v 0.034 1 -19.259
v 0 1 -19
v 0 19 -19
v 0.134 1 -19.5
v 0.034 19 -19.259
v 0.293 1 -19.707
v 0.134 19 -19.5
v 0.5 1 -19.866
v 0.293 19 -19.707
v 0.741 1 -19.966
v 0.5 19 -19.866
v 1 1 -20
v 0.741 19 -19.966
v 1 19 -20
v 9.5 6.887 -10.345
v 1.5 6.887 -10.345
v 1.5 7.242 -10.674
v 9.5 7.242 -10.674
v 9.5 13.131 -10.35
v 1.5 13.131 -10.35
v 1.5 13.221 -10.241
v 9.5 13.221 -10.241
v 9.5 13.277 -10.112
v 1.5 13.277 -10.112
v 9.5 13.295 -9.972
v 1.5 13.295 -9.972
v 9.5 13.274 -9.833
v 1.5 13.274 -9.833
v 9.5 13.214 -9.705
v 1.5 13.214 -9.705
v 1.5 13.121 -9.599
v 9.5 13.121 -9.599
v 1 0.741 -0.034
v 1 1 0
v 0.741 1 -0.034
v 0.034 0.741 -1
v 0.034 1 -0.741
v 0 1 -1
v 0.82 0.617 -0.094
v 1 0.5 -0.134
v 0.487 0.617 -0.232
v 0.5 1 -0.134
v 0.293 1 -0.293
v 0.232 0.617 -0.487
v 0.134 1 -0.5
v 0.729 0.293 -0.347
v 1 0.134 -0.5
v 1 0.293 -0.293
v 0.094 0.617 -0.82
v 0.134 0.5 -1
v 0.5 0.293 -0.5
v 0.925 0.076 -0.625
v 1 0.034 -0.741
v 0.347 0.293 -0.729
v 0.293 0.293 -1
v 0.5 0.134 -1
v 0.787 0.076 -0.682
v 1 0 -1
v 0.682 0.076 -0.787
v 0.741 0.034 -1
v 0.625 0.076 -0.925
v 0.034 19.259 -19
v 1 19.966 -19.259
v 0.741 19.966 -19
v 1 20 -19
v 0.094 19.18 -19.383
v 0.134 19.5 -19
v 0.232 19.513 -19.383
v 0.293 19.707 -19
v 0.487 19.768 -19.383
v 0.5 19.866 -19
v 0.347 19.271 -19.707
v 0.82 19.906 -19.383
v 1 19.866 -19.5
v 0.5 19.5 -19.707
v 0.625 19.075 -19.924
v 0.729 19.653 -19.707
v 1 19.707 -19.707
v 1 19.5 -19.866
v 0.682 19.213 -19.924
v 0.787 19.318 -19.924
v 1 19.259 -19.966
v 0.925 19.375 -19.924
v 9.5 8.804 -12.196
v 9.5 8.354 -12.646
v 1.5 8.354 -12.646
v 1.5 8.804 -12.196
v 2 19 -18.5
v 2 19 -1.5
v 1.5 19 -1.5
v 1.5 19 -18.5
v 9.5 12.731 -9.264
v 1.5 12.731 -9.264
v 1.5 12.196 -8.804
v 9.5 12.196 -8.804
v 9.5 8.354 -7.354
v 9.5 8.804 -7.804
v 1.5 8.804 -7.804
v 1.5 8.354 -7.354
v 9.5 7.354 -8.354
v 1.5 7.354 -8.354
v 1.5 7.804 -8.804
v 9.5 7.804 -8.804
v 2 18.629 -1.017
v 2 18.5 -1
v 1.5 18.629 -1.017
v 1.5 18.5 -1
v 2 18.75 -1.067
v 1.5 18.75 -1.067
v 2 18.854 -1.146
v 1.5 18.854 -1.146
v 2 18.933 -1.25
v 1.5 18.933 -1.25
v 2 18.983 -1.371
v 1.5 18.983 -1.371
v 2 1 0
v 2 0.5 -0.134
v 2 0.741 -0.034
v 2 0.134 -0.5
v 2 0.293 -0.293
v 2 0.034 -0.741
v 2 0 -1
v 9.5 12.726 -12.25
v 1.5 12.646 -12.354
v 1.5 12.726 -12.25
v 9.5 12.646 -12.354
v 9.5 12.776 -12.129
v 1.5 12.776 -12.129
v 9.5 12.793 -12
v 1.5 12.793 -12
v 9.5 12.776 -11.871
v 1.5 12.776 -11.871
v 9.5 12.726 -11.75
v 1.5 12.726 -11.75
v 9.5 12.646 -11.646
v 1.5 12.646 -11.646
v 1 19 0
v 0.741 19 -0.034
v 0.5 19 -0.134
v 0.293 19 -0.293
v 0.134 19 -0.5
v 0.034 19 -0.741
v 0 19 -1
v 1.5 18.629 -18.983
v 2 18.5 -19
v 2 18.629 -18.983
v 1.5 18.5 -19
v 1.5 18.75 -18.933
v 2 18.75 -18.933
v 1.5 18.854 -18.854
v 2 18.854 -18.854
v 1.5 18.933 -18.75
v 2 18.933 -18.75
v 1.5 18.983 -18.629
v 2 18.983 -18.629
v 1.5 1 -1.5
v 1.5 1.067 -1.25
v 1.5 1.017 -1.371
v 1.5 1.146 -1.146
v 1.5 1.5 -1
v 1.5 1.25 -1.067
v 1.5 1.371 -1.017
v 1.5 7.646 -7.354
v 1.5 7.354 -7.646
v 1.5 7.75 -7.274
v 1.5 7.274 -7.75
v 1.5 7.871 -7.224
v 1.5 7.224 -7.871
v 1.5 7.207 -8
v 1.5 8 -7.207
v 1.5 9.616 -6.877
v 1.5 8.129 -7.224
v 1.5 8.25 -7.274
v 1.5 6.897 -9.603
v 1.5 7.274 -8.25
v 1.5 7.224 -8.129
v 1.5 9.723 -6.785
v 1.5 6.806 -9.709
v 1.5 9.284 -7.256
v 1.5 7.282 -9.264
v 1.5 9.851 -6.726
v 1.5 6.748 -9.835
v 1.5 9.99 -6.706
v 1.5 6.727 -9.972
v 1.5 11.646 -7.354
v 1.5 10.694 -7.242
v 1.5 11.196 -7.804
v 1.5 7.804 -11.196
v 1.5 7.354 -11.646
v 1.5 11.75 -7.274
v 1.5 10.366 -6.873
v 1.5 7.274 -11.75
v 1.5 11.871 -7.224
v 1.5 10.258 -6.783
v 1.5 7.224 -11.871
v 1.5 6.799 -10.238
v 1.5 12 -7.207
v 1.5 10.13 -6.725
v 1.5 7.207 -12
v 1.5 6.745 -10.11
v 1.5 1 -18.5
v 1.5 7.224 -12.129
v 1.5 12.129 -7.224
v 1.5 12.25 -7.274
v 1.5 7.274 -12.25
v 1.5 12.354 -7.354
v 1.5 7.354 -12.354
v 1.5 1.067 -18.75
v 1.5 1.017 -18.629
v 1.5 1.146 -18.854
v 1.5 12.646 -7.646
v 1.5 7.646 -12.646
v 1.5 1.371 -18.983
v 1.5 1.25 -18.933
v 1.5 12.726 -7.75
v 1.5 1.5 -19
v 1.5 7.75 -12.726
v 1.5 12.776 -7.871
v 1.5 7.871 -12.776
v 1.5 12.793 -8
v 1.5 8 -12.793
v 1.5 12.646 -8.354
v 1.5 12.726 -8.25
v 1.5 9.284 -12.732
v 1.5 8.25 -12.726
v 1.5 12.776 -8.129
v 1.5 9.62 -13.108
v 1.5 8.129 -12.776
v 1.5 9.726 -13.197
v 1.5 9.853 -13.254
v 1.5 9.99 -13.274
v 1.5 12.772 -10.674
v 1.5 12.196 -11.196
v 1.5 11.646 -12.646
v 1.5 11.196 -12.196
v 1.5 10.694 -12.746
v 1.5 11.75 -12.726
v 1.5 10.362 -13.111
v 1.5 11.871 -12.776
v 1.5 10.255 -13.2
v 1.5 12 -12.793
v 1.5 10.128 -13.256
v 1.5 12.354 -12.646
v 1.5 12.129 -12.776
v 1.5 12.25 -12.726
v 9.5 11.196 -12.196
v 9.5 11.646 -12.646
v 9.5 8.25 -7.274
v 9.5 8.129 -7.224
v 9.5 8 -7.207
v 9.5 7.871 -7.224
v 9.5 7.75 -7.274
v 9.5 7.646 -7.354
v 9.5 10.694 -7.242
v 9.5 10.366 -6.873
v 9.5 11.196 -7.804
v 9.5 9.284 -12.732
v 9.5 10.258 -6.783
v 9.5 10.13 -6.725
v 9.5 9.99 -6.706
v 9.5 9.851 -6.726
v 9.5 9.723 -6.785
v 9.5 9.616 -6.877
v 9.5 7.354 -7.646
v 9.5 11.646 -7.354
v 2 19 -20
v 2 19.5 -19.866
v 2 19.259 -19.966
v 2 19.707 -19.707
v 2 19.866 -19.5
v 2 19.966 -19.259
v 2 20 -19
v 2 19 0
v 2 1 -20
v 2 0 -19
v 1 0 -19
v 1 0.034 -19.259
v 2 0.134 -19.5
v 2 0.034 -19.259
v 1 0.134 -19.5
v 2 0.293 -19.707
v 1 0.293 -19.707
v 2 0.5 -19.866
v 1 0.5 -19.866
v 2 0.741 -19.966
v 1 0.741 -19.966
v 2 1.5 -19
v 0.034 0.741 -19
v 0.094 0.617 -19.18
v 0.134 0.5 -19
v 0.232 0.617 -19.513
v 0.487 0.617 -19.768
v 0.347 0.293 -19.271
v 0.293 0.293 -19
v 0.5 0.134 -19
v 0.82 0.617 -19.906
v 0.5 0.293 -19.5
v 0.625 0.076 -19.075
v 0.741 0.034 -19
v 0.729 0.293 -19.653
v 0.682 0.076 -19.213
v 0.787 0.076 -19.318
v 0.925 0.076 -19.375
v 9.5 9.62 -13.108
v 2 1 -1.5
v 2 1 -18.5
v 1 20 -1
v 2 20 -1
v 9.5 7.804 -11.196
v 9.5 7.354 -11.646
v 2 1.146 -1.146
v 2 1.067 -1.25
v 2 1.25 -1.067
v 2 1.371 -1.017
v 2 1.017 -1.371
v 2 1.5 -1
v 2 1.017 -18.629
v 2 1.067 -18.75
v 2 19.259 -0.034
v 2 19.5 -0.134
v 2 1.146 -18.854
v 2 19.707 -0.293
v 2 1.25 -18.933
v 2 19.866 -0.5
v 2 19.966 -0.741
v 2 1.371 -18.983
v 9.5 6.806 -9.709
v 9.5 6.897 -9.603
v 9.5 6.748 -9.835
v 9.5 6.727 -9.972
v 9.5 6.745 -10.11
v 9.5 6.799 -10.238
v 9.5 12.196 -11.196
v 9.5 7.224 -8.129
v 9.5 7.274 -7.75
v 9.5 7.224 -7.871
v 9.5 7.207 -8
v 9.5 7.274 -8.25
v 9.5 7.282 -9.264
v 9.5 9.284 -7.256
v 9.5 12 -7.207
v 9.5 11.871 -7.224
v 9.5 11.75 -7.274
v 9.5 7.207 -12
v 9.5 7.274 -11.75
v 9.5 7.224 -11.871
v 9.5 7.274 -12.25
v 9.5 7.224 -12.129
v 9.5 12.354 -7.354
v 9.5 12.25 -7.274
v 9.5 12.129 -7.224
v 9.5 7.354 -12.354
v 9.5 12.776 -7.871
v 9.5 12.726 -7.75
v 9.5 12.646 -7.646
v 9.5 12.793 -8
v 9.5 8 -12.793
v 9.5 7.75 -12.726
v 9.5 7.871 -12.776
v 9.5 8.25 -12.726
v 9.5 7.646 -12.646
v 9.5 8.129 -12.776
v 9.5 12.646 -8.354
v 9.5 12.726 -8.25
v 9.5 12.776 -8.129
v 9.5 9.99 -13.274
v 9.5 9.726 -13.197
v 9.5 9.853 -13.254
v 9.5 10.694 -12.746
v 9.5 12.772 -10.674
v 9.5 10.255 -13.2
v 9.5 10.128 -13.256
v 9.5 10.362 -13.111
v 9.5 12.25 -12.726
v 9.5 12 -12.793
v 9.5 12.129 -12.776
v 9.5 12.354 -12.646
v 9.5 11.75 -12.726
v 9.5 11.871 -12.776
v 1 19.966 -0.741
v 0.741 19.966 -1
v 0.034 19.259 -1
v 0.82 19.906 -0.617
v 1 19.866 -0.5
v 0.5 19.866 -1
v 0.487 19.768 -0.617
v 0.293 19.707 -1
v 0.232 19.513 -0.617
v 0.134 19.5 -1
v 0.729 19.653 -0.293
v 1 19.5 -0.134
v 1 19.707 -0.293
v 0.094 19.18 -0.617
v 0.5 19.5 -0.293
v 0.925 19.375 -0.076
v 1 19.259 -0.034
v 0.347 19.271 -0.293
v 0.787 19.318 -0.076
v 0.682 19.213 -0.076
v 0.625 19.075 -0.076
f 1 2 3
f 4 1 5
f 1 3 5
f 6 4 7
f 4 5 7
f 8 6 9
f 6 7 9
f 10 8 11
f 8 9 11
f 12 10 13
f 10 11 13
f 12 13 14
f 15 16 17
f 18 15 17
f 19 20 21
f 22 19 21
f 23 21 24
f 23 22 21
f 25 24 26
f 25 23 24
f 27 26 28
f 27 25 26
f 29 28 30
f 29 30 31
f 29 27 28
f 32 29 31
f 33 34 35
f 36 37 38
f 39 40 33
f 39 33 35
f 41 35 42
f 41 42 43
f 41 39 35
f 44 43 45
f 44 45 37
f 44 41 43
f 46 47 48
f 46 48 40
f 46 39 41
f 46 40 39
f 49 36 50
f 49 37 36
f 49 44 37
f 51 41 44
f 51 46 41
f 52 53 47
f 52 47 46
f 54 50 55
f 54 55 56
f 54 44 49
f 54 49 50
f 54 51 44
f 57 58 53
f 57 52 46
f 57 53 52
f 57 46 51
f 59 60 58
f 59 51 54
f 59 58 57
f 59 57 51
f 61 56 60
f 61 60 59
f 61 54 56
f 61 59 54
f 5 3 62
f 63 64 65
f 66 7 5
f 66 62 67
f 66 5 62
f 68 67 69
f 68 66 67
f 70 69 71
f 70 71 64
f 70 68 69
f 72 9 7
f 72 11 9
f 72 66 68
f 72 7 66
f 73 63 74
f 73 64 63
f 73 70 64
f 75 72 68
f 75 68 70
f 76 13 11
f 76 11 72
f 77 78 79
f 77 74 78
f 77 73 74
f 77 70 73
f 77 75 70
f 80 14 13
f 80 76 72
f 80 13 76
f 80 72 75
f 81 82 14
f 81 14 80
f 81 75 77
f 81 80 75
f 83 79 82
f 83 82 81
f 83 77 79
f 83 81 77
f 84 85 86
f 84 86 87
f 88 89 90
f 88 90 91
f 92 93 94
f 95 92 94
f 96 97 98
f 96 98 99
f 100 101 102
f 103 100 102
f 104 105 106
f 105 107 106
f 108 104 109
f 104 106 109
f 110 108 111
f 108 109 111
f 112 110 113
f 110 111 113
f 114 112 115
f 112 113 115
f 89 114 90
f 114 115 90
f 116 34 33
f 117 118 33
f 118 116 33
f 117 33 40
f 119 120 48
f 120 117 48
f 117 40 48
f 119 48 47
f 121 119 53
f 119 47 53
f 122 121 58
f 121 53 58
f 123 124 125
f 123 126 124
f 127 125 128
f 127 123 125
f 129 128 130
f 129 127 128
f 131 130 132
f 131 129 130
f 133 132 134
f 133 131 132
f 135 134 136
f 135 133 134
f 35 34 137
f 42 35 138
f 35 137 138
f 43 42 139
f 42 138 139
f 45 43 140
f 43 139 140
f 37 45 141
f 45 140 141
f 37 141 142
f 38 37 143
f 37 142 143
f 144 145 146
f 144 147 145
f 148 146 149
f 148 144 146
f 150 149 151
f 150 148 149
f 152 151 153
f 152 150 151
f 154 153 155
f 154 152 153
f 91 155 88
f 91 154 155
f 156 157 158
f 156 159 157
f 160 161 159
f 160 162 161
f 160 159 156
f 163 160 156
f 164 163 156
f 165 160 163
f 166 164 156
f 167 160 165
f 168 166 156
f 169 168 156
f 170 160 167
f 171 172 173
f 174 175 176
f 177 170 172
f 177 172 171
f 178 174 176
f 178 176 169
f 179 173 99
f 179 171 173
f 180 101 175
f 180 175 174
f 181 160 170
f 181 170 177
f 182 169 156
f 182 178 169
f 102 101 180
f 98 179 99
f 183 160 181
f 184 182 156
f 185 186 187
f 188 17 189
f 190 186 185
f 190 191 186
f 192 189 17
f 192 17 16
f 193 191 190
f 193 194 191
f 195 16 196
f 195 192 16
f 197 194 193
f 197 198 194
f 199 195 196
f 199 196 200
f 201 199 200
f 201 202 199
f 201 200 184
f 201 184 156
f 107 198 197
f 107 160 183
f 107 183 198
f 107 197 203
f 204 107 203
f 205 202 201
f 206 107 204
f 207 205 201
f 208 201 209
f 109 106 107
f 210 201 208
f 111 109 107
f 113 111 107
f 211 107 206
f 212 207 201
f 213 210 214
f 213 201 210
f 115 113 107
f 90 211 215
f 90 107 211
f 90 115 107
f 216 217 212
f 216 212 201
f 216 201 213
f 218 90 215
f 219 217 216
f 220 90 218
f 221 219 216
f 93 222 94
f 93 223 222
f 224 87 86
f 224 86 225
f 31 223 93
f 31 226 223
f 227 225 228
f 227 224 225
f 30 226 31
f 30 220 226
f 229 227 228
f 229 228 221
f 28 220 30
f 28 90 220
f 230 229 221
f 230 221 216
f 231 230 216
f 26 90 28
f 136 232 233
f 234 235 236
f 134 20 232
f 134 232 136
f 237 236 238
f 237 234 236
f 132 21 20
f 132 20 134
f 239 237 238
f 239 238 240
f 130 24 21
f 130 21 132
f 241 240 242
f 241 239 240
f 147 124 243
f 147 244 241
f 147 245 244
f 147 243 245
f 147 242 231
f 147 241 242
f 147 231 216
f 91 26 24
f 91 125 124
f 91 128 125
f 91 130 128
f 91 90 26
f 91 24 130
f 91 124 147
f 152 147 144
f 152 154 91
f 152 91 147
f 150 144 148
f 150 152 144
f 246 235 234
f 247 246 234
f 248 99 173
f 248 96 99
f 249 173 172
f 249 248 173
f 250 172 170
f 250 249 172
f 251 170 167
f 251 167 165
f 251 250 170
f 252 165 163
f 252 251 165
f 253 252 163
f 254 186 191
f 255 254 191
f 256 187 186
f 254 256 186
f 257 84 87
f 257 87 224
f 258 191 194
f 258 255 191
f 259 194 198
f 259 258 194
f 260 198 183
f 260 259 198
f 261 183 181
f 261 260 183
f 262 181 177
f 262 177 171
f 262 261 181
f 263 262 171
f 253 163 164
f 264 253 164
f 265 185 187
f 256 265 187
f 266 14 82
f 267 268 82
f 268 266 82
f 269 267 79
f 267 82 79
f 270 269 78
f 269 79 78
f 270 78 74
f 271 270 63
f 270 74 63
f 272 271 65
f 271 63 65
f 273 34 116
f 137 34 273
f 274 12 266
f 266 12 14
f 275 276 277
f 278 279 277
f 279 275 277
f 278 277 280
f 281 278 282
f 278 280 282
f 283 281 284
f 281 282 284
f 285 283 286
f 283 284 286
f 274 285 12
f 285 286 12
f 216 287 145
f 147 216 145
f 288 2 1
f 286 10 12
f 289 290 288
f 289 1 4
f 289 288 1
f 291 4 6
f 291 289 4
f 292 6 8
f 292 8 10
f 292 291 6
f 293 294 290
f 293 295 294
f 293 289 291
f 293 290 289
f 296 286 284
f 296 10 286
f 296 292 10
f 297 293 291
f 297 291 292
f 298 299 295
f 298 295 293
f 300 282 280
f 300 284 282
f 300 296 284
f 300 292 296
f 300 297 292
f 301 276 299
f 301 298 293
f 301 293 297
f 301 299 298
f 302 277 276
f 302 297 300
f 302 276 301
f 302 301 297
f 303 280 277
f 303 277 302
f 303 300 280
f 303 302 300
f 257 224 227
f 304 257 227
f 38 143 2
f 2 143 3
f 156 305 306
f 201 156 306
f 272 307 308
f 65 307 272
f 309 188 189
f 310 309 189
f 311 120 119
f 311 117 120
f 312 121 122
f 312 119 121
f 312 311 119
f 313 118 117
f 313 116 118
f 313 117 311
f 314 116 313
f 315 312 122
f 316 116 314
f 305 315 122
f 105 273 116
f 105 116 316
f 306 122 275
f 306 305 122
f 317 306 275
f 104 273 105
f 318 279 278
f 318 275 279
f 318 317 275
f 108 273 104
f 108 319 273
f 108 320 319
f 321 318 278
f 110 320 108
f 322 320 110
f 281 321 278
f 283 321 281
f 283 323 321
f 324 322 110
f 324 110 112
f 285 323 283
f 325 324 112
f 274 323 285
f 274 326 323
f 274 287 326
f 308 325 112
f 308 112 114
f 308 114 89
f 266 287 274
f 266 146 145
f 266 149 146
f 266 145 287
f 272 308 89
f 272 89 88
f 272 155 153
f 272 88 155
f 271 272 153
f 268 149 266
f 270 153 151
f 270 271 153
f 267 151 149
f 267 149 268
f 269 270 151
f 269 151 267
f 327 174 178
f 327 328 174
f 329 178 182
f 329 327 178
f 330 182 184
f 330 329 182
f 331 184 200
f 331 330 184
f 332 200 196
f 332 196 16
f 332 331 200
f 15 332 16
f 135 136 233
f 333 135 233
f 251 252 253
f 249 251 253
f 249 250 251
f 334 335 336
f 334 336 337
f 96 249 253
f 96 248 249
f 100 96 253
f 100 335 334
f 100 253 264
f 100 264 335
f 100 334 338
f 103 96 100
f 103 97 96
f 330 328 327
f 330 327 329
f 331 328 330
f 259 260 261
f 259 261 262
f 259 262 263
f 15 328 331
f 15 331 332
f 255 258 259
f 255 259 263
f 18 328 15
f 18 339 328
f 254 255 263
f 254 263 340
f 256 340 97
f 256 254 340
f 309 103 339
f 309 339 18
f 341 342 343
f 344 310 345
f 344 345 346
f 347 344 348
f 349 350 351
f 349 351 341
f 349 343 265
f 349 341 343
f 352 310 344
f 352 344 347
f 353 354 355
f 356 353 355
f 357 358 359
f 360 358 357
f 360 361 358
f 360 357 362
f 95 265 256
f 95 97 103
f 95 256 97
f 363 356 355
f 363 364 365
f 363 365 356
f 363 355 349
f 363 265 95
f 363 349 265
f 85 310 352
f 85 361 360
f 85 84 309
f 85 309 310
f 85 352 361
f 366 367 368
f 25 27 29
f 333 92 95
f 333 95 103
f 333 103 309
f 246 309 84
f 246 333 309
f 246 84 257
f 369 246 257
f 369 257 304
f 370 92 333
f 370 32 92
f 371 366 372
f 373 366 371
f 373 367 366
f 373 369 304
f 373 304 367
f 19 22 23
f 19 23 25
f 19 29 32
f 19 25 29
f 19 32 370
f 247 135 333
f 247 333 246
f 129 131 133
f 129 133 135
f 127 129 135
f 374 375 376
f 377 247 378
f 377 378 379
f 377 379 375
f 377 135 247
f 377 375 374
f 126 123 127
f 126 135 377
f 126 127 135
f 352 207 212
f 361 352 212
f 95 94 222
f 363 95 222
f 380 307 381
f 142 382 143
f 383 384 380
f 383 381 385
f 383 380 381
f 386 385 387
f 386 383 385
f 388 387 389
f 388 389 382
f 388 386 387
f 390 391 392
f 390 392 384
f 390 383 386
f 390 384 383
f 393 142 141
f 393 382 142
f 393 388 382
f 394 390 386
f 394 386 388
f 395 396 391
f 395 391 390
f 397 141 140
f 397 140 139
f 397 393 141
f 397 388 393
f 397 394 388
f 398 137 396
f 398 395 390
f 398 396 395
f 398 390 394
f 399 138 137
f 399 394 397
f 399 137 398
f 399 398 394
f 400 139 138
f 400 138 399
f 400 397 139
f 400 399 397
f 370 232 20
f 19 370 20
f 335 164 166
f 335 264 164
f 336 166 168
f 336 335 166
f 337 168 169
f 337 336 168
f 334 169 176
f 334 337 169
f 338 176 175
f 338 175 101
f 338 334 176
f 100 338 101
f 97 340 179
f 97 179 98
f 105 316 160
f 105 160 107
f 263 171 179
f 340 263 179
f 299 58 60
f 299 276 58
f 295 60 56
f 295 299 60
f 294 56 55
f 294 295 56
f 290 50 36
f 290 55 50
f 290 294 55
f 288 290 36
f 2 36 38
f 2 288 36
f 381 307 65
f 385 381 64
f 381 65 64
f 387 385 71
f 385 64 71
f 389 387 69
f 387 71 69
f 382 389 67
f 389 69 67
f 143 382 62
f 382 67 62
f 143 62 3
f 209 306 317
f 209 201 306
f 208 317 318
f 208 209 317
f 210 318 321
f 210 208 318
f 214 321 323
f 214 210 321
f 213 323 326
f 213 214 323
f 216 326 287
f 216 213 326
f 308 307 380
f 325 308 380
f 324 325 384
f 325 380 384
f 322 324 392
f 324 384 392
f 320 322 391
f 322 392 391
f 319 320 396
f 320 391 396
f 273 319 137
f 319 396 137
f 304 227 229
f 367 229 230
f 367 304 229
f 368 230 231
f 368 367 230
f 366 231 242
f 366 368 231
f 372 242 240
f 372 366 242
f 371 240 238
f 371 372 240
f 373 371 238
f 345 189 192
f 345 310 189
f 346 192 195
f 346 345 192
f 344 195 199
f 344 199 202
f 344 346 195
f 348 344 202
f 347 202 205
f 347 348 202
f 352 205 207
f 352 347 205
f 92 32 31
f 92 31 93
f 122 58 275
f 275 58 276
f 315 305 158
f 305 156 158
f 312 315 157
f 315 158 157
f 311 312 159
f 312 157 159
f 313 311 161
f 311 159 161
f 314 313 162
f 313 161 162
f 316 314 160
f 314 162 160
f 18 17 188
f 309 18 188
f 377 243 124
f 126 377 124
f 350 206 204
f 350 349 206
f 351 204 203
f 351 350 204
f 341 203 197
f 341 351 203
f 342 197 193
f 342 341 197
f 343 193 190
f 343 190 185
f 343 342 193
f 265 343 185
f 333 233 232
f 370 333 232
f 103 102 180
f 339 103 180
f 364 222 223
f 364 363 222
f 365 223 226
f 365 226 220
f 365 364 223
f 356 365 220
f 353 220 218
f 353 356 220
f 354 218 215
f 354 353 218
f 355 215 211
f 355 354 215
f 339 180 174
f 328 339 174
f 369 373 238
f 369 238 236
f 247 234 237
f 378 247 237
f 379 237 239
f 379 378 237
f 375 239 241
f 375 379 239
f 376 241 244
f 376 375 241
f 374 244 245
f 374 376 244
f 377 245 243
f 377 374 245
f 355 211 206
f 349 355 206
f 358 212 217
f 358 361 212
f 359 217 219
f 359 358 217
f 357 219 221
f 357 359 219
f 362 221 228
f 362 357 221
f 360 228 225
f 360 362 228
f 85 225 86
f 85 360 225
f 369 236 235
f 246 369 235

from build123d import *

# Parameters (mm, degrees)
SKETCH2_W           = 20
SKETCH2_H           = 20
BOSS_EXTRUDE1_DEPTH = 2
SKETCH3_W           = 18
SKETCH3_H           = 18
CUT_EXTRUDE1_DEPTH  = 0.5
FILLET1_R           = 1
FILLET2_R           = 1
FILLET3_R           = 0.5
BOSS_EXTRUDE3_DEPTH = 8
FILLET4_R           = 0.5


with BuildPart() as part:
    # Sketch2 → Boss-Extrude1 (new body)
    with BuildSketch(Plane(origin=(0, 0, 0), x_dir=(0, 0, -1), z_dir=(1, 0, 0))):
        with Locations((10, 10)):
            Rectangle(SKETCH2_W, SKETCH2_H)
    extrude(amount=BOSS_EXTRUDE1_DEPTH)

    # Sketch3 → Cut-Extrude1 (cut)
    with BuildSketch(Plane(origin=(2, 0, 0), x_dir=(0, 0, -1), z_dir=(1, 0, 0))):
        with Locations((10, 10)):
            Rectangle(SKETCH3_W, SKETCH3_H)
    extrude(amount=-CUT_EXTRUDE1_DEPTH, mode=Mode.SUBTRACT)

    # Fillet1
    fillet1_edges = [part.edges().sort_by_distance(p)[0] for p in [
        (0, 20, -10),
        (0, 10, -20),
        (0, 0, -10),
        (0, 10, 0),
    ]]
    fillet(fillet1_edges, radius=FILLET1_R)

    # Fillet2
    # the kernel refuses this fillet: 1 mm, written as the material it takes off along each edge
    with BuildSketch(Plane(origin=(1, 19, -1), x_dir=(0, 1, 0), z_dir=(0, 0, 1))) as fillet2_piece_1_section:
        Polygon((0, 0), (FILLET2_R, 0), (FILLET2_R, FILLET2_R), (0, FILLET2_R), align=None)
    fillet2_piece_1 = extrude(amount=FILLET2_R, mode=Mode.PRIVATE)
    fillet2_piece_1 = fillet2_piece_1 - Plane(origin=(1, 19, -1), x_dir=(0.7071067811865475, -0.7071067811865475, 0), z_dir=(0, 0, 1)) * Sphere(FILLET2_R, mode=Mode.PRIVATE)
    add(fillet2_piece_1, mode=Mode.SUBTRACT)
    with BuildSketch(Plane(origin=(1, 19, -19), x_dir=(0, 1, 0), z_dir=(0, 0, -1))) as fillet2_piece_2_section:
        Polygon((0, 0), (FILLET2_R, 0), (FILLET2_R, -FILLET2_R), (0, -FILLET2_R), align=None)
    fillet2_piece_2 = extrude(amount=FILLET2_R, mode=Mode.PRIVATE)
    fillet2_piece_2 = fillet2_piece_2 - Plane(origin=(1, 19, -19), x_dir=(0.7071067811865475, -0.7071067811865475, 0), z_dir=(0, 0, -1)) * Sphere(FILLET2_R, mode=Mode.PRIVATE)
    add(fillet2_piece_2, mode=Mode.SUBTRACT)
    with BuildSketch(Plane(origin=(1, 1, -1), x_dir=(0, 0, 1), z_dir=(0, -1, 0))) as fillet2_piece_3_section:
        Polygon((0, 0), (FILLET2_R, 0), (FILLET2_R, FILLET2_R), (0, FILLET2_R), align=None)
    fillet2_piece_3 = extrude(amount=FILLET2_R, mode=Mode.PRIVATE)
    fillet2_piece_3 = fillet2_piece_3 - Plane(origin=(1, 1, -1), x_dir=(0.7071067811865475, 0, -0.7071067811865475), z_dir=(0, -1, 0)) * Sphere(FILLET2_R, mode=Mode.PRIVATE)
    add(fillet2_piece_3, mode=Mode.SUBTRACT)
    with BuildSketch(Plane(origin=(1, 1, -19), x_dir=(0, 0, -1), z_dir=(0, -1, 0))) as fillet2_piece_4_section:
        Polygon((0, 0), (FILLET2_R, 0), (FILLET2_R, -FILLET2_R), (0, -FILLET2_R), align=None)
    fillet2_piece_4 = extrude(amount=FILLET2_R, mode=Mode.PRIVATE)
    fillet2_piece_4 = fillet2_piece_4 - Plane(origin=(1, 1, -19), x_dir=(0.7071067811865475, 0, 0.7071067811865475), z_dir=(0, -1, 0)) * Sphere(FILLET2_R, mode=Mode.PRIVATE)
    add(fillet2_piece_4, mode=Mode.SUBTRACT)
    with BuildSketch(Plane(origin=(1, 20, 0), x_dir=(0, -1, 0), z_dir=(1, 0, 0)), Plane(origin=(1, 0, 0), x_dir=(0, 0, -1), z_dir=(1, 0, 0))) as fillet2_piece_5:
        with BuildLine():
            CenterArc((FILLET2_R, FILLET2_R), FILLET2_R, 180, 90)
            Line((0, FILLET2_R), (0, 0))
            Line((0, 0), (FILLET2_R, 0))
        make_face()
    extrude(amount=3.5, mode=Mode.SUBTRACT)
    with BuildSketch(Plane(origin=(1, 20, -20), x_dir=(0, -1, 0), z_dir=(1, 0, 0)), Plane(origin=(1, 0, -20), x_dir=(0, 0, 1), z_dir=(1, 0, 0))) as fillet2_piece_6:
        with BuildLine():
            CenterArc((FILLET2_R, -FILLET2_R), FILLET2_R, 90, 90)
            Line((0, -FILLET2_R), (0, 0))
            Line((0, 0), (FILLET2_R, 0))
        make_face()
    extrude(amount=3.5, mode=Mode.SUBTRACT)

    # Fillet3
    fillet3_edges = [part.edges().sort_by_distance(p)[0] for p in [
        (1.75, 1, -1),
        (1.75, 19, -1),
        (1.75, 19, -19),
        (1.75, 1, -19),
    ]]
    fillet(fillet3_edges, radius=FILLET3_R)

    # Sketch5 → Boss-Extrude3 (add)
    with BuildSketch(Plane(origin=(1.5, 0, 0), x_dir=(0, 0, -1), z_dir=(1, 0, 0))):
        with BuildLine():
            Line((10.674031368, 12.407379911), (10.674031368, 12.772052319))
            Line((10.674031368, 12.772052319), (9.969031368, 13.551320747))
            Line((9.969031368, 13.551320747), (9.264031368, 12.730578714))
            Line((9.264031368, 12.730578714), (9.264031368, 12.389160229))
            ThreePointArc((9.264031368, 12.389160229), (9.967720161, 12.499742887), (10.674031368, 12.407379911))
        make_face()
        with BuildLine():
            ThreePointArc((8.804439368, 12.195534071), (9.029395093, 12.30383605), (9.264031368, 12.389160229))
            Line((9.264031368, 12.389160229), (9.264031368, 12.730578714))
            Line((9.264031368, 12.730578714), (8.804439368, 12.195534071))
        make_face()
        with BuildLine():
            ThreePointArc((10.674031368, 12.407379911), (10.940799854, 12.316184891), (11.19560436, 12.195534071))
            Line((11.19560436, 12.195534071), (10.674031368, 12.772052319))
            Line((10.674031368, 12.772052319), (10.674031368, 12.407379911))
        make_face()
        with BuildLine():
            Line((9.264031368, 12.195534071), (10.674031368, 12.195534071))
            Line((10.674031368, 12.195534071), (10.674031368, 12.407379911))
            ThreePointArc((10.674031368, 12.407379911), (9.967720161, 12.499742887), (9.264031368, 12.389160229))
            Line((9.264031368, 12.389160229), (9.264031368, 12.195534071))
        make_face()
        with BuildLine():
            Line((8.804439368, 12.195534071), (9.264031368, 12.195534071))
            Line((9.264031368, 12.195534071), (9.264031368, 12.389160229))
            ThreePointArc((9.264031368, 12.389160229), (9.029395093, 12.30383605), (8.804439368, 12.195534071))
        make_face()
        with BuildLine():
            Line((10.674031368, 12.195534071), (11.19560436, 12.195534071))
            ThreePointArc((11.19560436, 12.195534071), (10.940799854, 12.316184891), (10.674031368, 12.407379911))
            Line((10.674031368, 12.407379911), (10.674031368, 12.195534071))
        make_face()
        Polygon((10.000021864, 10.999951576), (10.674031368, 11.67396108), (10.674031368, 12.195534071), (9.264031368, 12.195534071), (9.264031368, 11.735942071), align=None)
        Polygon((9.264031368, 11.735942071), (9.264031368, 12.195534071), (8.804439368, 12.195534071), align=None)
        Polygon((10.674031368, 11.67396108), (11.19560436, 12.195534071), (10.674031368, 12.195534071), align=None)
        with BuildLine():
            ThreePointArc((12.19560436, 11.195534071), (11.767788817, 11.767718529), (11.19560436, 12.195534071))
            Line((11.19560436, 12.195534071), (10.674031368, 11.67396108))
            Line((10.674031368, 11.67396108), (10.674031368, 10.694356296))
            Line((10.674031368, 10.694356296), (11.694426585, 10.694356296))
            Line((11.694426585, 10.694356296), (12.19560436, 11.195534071))
        make_face()
        with BuildLine():
            Line((13.000021864, 11.999951576), (12.000021864, 12.999951576))
            Line((12.000021864, 12.999951576), (11.19560436, 12.195534071))
            ThreePointArc((11.19560436, 12.195534071), (11.767788817, 11.767718529), (12.19560436, 11.195534071))
            Line((12.19560436, 11.195534071), (13.000021864, 11.999951576))
        make_face()
        with BuildLine():
            Line((9.264031368, 10.694356296), (9.264031368, 11.735942071))
            Line((9.264031368, 11.735942071), (8.804439368, 12.195534071))
            ThreePointArc((8.804439368, 12.195534071), (8.232254911, 11.767718529), (7.804439368, 11.195534071))
            Line((7.804439368, 11.195534071), (8.305617143, 10.694356296))
            Line((8.305617143, 10.694356296), (9.264031368, 10.694356296))
        make_face()
        with BuildLine():
            ThreePointArc((7.804439368, 11.195534071), (8.232254911, 11.767718529), (8.804439368, 12.195534071))
            Line((8.804439368, 12.195534071), (8.000021864, 12.999951576))
            Line((8.000021864, 12.999951576), (7.000021864, 11.999951576))
            Line((7.000021864, 11.999951576), (7.804439368, 11.195534071))
        make_face()
        Polygon((9.694426585, 10.694356296), (10.000021864, 10.999951576), (9.264031368, 11.735942071), (9.264031368, 10.694356296), align=None)
        Polygon((10.674031368, 10.694356296), (10.674031368, 11.67396108), (10.000021864, 10.999951576), (10.305617143, 10.694356296), align=None)
        Polygon((10.305617143, 10.694356296), (10.000021864, 10.999951576), (9.694426585, 10.694356296), align=None)
        Polygon((9.264031368, 10.26396108), (9.694426585, 10.694356296), (9.264031368, 10.694356296), align=None)
        Polygon((9.000021864, 9.999951576), (9.264031368, 10.26396108), (9.264031368, 10.694356296), (8.305617143, 10.694356296), align=None)
        Polygon((10.305617143, 10.694356296), (9.694426585, 10.694356296), (9.264031368, 10.26396108), (9.264031368, 9.735942071), (9.715617143, 9.284356296), (10.284426585, 9.284356296), (10.674031368, 9.67396108), (10.674031368, 10.325942071), align=None)
        Polygon((11.000021864, 9.999951576), (11.694426585, 10.694356296), (10.674031368, 10.694356296), (10.674031368, 10.325942071), align=None)
        Polygon((9.264031368, 9.735942071), (9.264031368, 10.26396108), (9.000021864, 9.999951576), align=None)
        Polygon((10.674031368, 9.67396108), (11.000021864, 9.999951576), (10.674031368, 10.325942071), align=None)
        Polygon((10.674031368, 10.325942071), (10.674031368, 10.694356296), (10.305617143, 10.694356296), align=None)
        with BuildLine():
            Line((7.804439368, 10.694356296), (7.804439368, 11.195534071))
            ThreePointArc((7.804439368, 11.195534071), (7.687799186, 10.950544173), (7.59839698, 10.694356296))
            Line((7.59839698, 10.694356296), (7.804439368, 10.694356296))
        make_face()
        with BuildLine():
            Line((7.804439368, 9.284356296), (7.804439368, 10.694356296))
            Line((7.804439368, 10.694356296), (7.59839698, 10.694356296))
            ThreePointArc((7.59839698, 10.694356296), (7.500046256, 9.988908081), (7.604625572, 9.284356296))
            Line((7.604625572, 9.284356296), (7.804439368, 9.284356296))
        make_face()
        with BuildLine():
            ThreePointArc((7.59839698, 10.694356296), (7.687799186, 10.950544173), (7.804439368, 11.195534071))
            Line((7.804439368, 11.195534071), (7.241968907, 10.694356296))
            Line((7.241968907, 10.694356296), (7.59839698, 10.694356296))
        make_face()
        with BuildLine():
            Line((7.59839698, 10.694356296), (7.241968907, 10.694356296))
            Line((7.241968907, 10.694356296), (6.450749314, 9.989356296))
            Line((6.450749314, 9.989356296), (7.256117908, 9.284356296))
            Line((7.256117908, 9.284356296), (7.604625572, 9.284356296))
            ThreePointArc((7.604625572, 9.284356296), (7.500046256, 9.988908081), (7.59839698, 10.694356296))
        make_face()
        Polygon((8.284426585, 9.284356296), (9.000021864, 9.999951576), (8.305617143, 10.694356296), (7.804439368, 10.694356296), (7.804439368, 9.284356296), align=None)
        Polygon((8.305617143, 10.694356296), (7.804439368, 11.195534071), (7.804439368, 10.694356296), align=None)
        with BuildLine():
            Line((7.804439368, 8.80436908), (7.804439368, 9.284356296))
            Line((7.804439368, 9.284356296), (7.604625572, 9.284356296))
            ThreePointArc((7.604625572, 9.284356296), (7.692020891, 9.039154245), (7.804439368, 8.80436908))
        make_face()
        Polygon((7.804439368, 8.80436908), (8.284426585, 9.284356296), (7.804439368, 9.284356296), align=None)
        with BuildLine():
            Line((9.264031368, 9.284356296), (8.284426585, 9.284356296))
            Line((8.284426585, 9.284356296), (7.804439368, 8.80436908))
            ThreePointArc((7.804439368, 8.80436908), (8.232254911, 8.232184623), (8.804439368, 7.80436908))
            Line((8.804439368, 7.80436908), (9.264031368, 8.26396108))
            Line((9.264031368, 8.26396108), (9.264031368, 9.284356296))
        make_face()
        Polygon((9.264031368, 9.735942071), (9.000021864, 9.999951576), (8.284426585, 9.284356296), (9.264031368, 9.284356296), align=None)
        Polygon((9.715617143, 9.284356296), (9.264031368, 9.735942071), (9.264031368, 9.284356296), align=None)
        Polygon((9.264031368, 8.26396108), (10.000021864, 8.999951576), (9.715617143, 9.284356296), (9.264031368, 9.284356296), align=None)
        Polygon((9.264031368, 7.80436908), (9.264031368, 8.26396108), (8.804439368, 7.80436908), align=None)
        Polygon((10.674031368, 8.325942071), (10.000021864, 8.999951576), (9.264031368, 8.26396108), (9.264031368, 7.80436908), (10.674031368, 7.80436908), align=None)
        with BuildLine():
            Line((10.674031368, 7.592523241), (10.674031368, 7.80436908))
            Line((10.674031368, 7.80436908), (9.264031368, 7.80436908))
            Line((9.264031368, 7.80436908), (9.264031368, 7.610742922))
            ThreePointArc((9.264031368, 7.610742922), (9.967720161, 7.500160264), (10.674031368, 7.592523241))
        make_face()
        with BuildLine():
            Line((12.19560436, 8.80436908), (11.715617143, 9.284356296))
            Line((11.715617143, 9.284356296), (10.674031368, 9.284356296))
            Line((10.674031368, 9.284356296), (10.674031368, 8.325942071))
            Line((10.674031368, 8.325942071), (11.19560436, 7.80436908))
            ThreePointArc((11.19560436, 7.80436908), (11.767788817, 8.232184623), (12.19560436, 8.80436908))
        make_face()
        Polygon((10.674031368, 9.284356296), (10.284426585, 9.284356296), (10.000021864, 8.999951576), (10.674031368, 8.325942071), align=None)
        Polygon((10.000021864, 8.999951576), (10.284426585, 9.284356296), (9.715617143, 9.284356296), align=None)
        Polygon((10.674031368, 9.284356296), (10.674031368, 9.67396108), (10.284426585, 9.284356296), align=None)
        Polygon((11.715617143, 9.284356296), (11.000021864, 9.999951576), (10.674031368, 9.67396108), (10.674031368, 9.284356296), align=None)
        Polygon((12.19560436, 10.694356296), (11.694426585, 10.694356296), (11.000021864, 9.999951576), (11.715617143, 9.284356296), (12.19560436, 9.284356296), align=None)
        Polygon((12.19560436, 10.694356296), (12.19560436, 11.195534071), (11.694426585, 10.694356296), align=None)
        with BuildLine():
            ThreePointArc((12.401646748, 10.694356296), (12.312244542, 10.950544173), (12.19560436, 11.195534071))
            Line((12.19560436, 11.195534071), (12.19560436, 10.694356296))
            Line((12.19560436, 10.694356296), (12.401646748, 10.694356296))
        make_face()
        with BuildLine():
            Line((12.401646748, 10.694356296), (12.19560436, 10.694356296))
            Line((12.19560436, 10.694356296), (12.19560436, 9.284356296))
            Line((12.19560436, 9.284356296), (12.395418156, 9.284356296))
            ThreePointArc((12.395418156, 9.284356296), (12.473732713, 9.638351472), (12.500021864, 9.999951576))
            ThreePointArc((12.500021864, 9.999951576), (12.475305909, 10.350620786), (12.401646748, 10.694356296))
        make_face()
        Polygon((12.19560436, 8.80436908), (12.19560436, 9.284356296), (11.715617143, 9.284356296), align=None)
        with BuildLine():
            Line((12.395418156, 9.284356296), (12.19560436, 9.284356296))
            Line((12.19560436, 9.284356296), (12.19560436, 8.80436908))
            ThreePointArc((12.19560436, 8.80436908), (12.308022836, 9.039154245), (12.395418156, 9.284356296))
        make_face()
        with BuildLine():
            Line((13.520749314, 9.989356296), (12.746214074, 10.694356296))
            Line((12.746214074, 10.694356296), (12.401646748, 10.694356296))
            ThreePointArc((12.401646748, 10.694356296), (12.475305909, 10.350620786), (12.500021864, 9.999951576))
            ThreePointArc((12.500021864, 9.999951576), (12.473732713, 9.638351472), (12.395418156, 9.284356296))
            Line((12.395418156, 9.284356296), (12.732363431, 9.284356296))
            Line((12.732363431, 9.284356296), (13.520749314, 9.989356296))
        make_face()
        with BuildLine():
            Line((12.19560436, 8.80436908), (12.732363431, 9.284356296))
            Line((12.732363431, 9.284356296), (12.395418156, 9.284356296))
            ThreePointArc((12.395418156, 9.284356296), (12.308022836, 9.039154245), (12.19560436, 8.80436908))
        make_face()
        with BuildLine():
            Line((12.746214074, 10.694356296), (12.19560436, 11.195534071))
            ThreePointArc((12.19560436, 11.195534071), (12.312244542, 10.950544173), (12.401646748, 10.694356296))
            Line((12.401646748, 10.694356296), (12.746214074, 10.694356296))
        make_face()
        Polygon((10.674031368, 7.80436908), (11.19560436, 7.80436908), (10.674031368, 8.325942071), align=None)
        with BuildLine():
            ThreePointArc((10.674031368, 7.592523241), (10.940799854, 7.68371826), (11.19560436, 7.80436908))
            Line((11.19560436, 7.80436908), (10.674031368, 7.80436908))
            Line((10.674031368, 7.80436908), (10.674031368, 7.592523241))
        make_face()
        with BuildLine():
            Line((9.264031368, 7.610742922), (9.264031368, 7.80436908))
            Line((9.264031368, 7.80436908), (8.804439368, 7.80436908))
            ThreePointArc((8.804439368, 7.80436908), (9.029395093, 7.696067101), (9.264031368, 7.610742922))
        make_face()
        with BuildLine():
            Line((9.264031368, 7.282244225), (9.264031368, 7.610742922))
            ThreePointArc((9.264031368, 7.610742922), (9.029395093, 7.696067101), (8.804439368, 7.80436908))
            Line((8.804439368, 7.80436908), (9.264031368, 7.282244225))
        make_face()
        with BuildLine():
            Line((9.969031368, 6.481320747), (10.674031368, 7.241772087))
            Line((10.674031368, 7.241772087), (10.674031368, 7.592523241))
            ThreePointArc((10.674031368, 7.592523241), (9.967720161, 7.500160264), (9.264031368, 7.610742922))
            Line((9.264031368, 7.610742922), (9.264031368, 7.282244225))
            Line((9.264031368, 7.282244225), (9.969031368, 6.481320747))
        make_face()
        with BuildLine():
            Line((10.674031368, 7.241772087), (11.19560436, 7.80436908))
            ThreePointArc((11.19560436, 7.80436908), (10.940799854, 7.68371826), (10.674031368, 7.592523241))
            Line((10.674031368, 7.592523241), (10.674031368, 7.241772087))
        make_face()
        with BuildLine():
            ThreePointArc((8.804439368, 7.80436908), (8.232254911, 8.232184623), (7.804439368, 8.80436908))
            Line((7.804439368, 8.80436908), (7.000021864, 7.999951576))
            Line((7.000021864, 7.999951576), (8.000021864, 6.999951576))
            Line((8.000021864, 6.999951576), (8.804439368, 7.80436908))
        make_face()
        with BuildLine():
            Line((13.000021864, 7.999951576), (12.19560436, 8.80436908))
            ThreePointArc((12.19560436, 8.80436908), (11.767788817, 8.232184623), (11.19560436, 7.80436908))
            Line((11.19560436, 7.80436908), (12.000021864, 6.999951576))
            Line((12.000021864, 6.999951576), (13.000021864, 7.999951576))
        make_face()
        with BuildLine():
            ThreePointArc((7.804439368, 8.80436908), (7.692020891, 9.039154245), (7.604625572, 9.284356296))
            Line((7.604625572, 9.284356296), (7.256117908, 9.284356296))
            Line((7.256117908, 9.284356296), (7.804439368, 8.80436908))
        make_face()
    extrude(amount=BOSS_EXTRUDE3_DEPTH)

    # Fillet4
    fillet4_edges = [part.edges().sort_by_distance(p)[0] for p in [
        (5.5, 6.999951576, -8.000021864),
        (5.5, 6.481320747, -9.969031368),
        (5.5, 6.999951576, -12.000021864),
        (5.5, 7.999951576, -13.000021864),
        (5.5, 9.989356296, -13.520749314),
        (5.5, 11.999951576, -13.000021864),
        (5.5, 12.999951576, -12.000021864),
        (5.5, 13.551320747, -9.969031368),
        (5.5, 12.999951576, -8.000021864),
        (5.5, 11.999951576, -7.000021864),
        (5.5, 9.989356296, -6.450749314),
        (5.5, 7.999951576, -7.000021864),
    ]]
    fillet(fillet4_edges, radius=FILLET4_R)


solid = part.part
